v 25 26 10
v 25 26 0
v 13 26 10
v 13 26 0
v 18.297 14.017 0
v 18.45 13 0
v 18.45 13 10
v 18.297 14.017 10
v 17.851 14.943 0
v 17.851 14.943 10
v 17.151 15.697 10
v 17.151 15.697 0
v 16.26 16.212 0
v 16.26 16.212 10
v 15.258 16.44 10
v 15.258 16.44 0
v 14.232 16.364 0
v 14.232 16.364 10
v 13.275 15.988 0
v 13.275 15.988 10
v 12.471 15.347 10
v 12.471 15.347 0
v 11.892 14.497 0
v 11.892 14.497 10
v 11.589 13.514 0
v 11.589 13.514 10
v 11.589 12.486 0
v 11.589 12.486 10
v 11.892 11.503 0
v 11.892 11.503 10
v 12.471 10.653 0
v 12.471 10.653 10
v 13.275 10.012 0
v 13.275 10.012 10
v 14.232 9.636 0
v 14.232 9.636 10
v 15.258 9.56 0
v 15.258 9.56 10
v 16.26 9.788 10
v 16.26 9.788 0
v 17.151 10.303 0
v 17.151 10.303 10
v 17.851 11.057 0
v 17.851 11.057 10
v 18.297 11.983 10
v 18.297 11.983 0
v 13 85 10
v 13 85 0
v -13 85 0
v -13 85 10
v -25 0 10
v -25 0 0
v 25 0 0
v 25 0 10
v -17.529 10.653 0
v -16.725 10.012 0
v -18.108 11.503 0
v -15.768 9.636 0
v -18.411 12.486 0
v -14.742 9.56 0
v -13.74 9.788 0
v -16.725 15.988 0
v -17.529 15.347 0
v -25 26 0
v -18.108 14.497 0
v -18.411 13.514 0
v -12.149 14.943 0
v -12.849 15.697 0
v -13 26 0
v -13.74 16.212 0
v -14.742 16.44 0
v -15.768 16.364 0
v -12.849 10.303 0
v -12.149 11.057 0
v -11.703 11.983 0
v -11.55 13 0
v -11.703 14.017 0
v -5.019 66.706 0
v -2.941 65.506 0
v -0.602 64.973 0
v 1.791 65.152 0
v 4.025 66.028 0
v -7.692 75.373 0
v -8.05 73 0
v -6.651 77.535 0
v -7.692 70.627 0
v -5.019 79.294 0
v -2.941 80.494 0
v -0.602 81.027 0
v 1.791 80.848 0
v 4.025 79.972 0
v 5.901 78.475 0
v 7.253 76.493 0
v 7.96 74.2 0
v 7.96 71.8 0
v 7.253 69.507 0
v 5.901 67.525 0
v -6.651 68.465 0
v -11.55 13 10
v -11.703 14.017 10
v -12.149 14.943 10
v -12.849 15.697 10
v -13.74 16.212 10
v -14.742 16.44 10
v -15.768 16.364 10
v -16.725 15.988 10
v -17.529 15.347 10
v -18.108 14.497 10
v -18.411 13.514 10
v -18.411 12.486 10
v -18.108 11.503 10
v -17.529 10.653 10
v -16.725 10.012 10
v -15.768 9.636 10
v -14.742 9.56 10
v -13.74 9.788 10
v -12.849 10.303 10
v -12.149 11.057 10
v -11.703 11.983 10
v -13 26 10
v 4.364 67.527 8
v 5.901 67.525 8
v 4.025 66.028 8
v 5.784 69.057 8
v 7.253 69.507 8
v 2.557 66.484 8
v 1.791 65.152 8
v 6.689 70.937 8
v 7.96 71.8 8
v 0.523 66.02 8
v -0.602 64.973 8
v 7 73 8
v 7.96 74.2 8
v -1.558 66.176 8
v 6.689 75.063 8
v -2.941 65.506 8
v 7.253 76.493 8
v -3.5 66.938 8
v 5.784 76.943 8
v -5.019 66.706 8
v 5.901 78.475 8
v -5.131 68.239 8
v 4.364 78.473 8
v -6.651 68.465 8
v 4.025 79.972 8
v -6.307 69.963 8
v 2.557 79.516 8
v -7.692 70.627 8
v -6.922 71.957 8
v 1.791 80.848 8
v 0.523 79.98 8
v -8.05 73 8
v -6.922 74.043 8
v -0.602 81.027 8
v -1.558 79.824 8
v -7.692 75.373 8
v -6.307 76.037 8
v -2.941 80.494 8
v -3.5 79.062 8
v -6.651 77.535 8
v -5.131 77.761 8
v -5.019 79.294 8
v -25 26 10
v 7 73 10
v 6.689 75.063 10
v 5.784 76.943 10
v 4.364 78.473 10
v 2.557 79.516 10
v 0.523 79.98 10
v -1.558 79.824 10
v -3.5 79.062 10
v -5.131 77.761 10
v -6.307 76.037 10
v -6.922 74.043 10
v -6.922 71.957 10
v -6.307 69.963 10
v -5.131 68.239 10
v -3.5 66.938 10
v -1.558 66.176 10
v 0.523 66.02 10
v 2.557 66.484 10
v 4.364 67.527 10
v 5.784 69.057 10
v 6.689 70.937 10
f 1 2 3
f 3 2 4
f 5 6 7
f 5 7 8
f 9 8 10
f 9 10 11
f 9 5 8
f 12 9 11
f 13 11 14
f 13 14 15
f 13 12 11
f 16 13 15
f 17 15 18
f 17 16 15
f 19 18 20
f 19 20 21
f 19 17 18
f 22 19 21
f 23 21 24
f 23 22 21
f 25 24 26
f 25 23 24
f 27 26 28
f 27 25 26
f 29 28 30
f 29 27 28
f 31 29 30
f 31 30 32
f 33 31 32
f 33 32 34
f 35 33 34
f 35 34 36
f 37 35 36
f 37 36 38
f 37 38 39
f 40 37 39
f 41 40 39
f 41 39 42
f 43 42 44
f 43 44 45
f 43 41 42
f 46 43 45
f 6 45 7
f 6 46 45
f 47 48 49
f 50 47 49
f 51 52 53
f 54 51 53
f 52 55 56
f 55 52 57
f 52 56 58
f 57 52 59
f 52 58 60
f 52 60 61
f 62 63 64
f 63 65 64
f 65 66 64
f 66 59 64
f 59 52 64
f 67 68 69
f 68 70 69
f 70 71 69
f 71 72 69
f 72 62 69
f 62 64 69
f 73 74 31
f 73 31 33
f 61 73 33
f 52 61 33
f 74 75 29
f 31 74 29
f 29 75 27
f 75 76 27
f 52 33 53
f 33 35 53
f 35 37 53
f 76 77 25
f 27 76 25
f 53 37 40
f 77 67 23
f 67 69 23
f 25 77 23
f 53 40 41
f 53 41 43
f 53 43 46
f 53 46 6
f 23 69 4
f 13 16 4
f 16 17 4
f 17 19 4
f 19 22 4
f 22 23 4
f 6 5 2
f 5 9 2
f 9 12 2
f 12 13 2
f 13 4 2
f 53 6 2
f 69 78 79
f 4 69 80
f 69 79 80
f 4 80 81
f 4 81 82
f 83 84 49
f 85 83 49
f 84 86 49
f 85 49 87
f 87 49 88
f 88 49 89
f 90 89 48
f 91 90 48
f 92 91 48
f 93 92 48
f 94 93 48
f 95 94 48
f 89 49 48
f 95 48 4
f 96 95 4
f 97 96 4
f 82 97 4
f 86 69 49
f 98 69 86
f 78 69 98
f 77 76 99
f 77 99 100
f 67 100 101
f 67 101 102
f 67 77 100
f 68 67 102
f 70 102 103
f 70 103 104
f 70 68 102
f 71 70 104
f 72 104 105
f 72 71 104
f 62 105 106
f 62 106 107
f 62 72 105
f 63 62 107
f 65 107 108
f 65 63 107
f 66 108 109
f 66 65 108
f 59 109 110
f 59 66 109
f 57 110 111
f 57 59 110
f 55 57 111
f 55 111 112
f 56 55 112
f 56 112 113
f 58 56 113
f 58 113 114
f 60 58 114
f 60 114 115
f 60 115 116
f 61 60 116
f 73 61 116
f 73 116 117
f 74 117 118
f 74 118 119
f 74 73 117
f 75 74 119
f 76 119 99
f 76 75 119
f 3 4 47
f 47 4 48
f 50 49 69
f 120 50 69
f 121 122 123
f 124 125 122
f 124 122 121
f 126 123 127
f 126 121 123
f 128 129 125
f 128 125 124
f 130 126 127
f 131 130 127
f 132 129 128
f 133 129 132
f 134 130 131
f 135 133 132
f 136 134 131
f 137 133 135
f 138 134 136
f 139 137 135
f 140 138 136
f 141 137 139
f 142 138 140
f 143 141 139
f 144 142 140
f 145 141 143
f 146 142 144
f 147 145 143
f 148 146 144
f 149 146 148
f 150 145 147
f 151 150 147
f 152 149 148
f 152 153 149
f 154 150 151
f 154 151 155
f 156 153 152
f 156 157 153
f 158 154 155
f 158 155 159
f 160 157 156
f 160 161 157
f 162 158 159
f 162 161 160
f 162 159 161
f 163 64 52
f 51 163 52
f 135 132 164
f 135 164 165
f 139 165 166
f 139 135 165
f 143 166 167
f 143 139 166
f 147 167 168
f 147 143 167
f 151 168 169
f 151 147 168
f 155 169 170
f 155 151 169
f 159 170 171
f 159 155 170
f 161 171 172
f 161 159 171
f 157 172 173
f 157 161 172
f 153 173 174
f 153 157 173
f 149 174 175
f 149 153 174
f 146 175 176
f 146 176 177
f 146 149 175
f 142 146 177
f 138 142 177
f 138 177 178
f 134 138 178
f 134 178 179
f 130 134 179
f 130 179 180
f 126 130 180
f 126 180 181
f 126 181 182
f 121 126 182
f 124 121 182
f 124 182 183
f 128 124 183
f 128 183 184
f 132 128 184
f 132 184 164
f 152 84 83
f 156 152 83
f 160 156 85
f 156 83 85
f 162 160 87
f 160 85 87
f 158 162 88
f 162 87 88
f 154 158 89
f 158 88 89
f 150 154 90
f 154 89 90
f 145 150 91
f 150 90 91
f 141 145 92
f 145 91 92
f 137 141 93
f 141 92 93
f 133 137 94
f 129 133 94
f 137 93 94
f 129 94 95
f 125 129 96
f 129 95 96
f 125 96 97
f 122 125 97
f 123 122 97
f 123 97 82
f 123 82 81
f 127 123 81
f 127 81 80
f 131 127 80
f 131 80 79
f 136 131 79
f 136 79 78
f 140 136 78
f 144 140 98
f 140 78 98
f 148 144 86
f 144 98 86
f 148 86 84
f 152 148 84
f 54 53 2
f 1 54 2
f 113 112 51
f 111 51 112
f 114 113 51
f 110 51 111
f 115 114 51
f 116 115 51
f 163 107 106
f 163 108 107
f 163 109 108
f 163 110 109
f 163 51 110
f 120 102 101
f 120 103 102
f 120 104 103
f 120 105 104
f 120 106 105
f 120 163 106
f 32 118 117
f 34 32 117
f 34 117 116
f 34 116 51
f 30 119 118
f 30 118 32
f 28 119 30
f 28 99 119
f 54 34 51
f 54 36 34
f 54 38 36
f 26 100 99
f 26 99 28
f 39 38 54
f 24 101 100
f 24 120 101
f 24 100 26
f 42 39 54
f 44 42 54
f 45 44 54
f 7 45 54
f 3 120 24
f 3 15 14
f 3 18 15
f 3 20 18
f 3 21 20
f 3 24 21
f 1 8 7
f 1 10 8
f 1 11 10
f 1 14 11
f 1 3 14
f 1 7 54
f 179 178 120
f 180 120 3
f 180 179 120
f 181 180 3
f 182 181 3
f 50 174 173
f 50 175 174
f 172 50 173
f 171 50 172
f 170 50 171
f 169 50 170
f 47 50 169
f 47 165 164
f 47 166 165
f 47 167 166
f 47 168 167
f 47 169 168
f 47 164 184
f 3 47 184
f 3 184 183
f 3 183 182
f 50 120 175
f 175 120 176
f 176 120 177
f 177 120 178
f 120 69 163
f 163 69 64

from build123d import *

# Parameters (mm, degrees)
SKETCH_1_R          = 7
SKETCH_1_R_2        = 3.45
EXTRUDE_1_DEPTH     = 10
SKETCH_2_R          = 8.05
SKETCH_2_R_2        = 4
CUT_EXTRUDE_1_DEPTH = 8


with BuildPart() as part:
    # 草图1 → 凸台-拉伸1 (new body)
    with BuildSketch(Plane.XY):
        Polygon((-25, 0), (25, 0), (25, 26), (13, 26), (13, 85), (-13, 85), (-13, 26), (-25, 26), align=None)
        with Locations((0, 73)):
            Circle(SKETCH_1_R, mode=Mode.SUBTRACT)
        with Locations((-15, 13)):
            Circle(SKETCH_1_R_2, mode=Mode.SUBTRACT)
        with Locations((15, 13)):
            Circle(SKETCH_1_R_2, mode=Mode.SUBTRACT)
    extrude(amount=EXTRUDE_1_DEPTH)

    # 草图2 → 切除-拉伸1 (cut)
    with BuildSketch(Plane(origin=(0, 0, 0), x_dir=(-1, 0, 0), z_dir=(0, 0, -1))):
        with Locations((0, 73)):
            Circle(SKETCH_2_R)
        with Locations((0, 73)):
            Circle(SKETCH_2_R_2, mode=Mode.SUBTRACT)
    extrude(amount=-CUT_EXTRUDE_1_DEPTH, mode=Mode.SUBTRACT)


solid = part.part
